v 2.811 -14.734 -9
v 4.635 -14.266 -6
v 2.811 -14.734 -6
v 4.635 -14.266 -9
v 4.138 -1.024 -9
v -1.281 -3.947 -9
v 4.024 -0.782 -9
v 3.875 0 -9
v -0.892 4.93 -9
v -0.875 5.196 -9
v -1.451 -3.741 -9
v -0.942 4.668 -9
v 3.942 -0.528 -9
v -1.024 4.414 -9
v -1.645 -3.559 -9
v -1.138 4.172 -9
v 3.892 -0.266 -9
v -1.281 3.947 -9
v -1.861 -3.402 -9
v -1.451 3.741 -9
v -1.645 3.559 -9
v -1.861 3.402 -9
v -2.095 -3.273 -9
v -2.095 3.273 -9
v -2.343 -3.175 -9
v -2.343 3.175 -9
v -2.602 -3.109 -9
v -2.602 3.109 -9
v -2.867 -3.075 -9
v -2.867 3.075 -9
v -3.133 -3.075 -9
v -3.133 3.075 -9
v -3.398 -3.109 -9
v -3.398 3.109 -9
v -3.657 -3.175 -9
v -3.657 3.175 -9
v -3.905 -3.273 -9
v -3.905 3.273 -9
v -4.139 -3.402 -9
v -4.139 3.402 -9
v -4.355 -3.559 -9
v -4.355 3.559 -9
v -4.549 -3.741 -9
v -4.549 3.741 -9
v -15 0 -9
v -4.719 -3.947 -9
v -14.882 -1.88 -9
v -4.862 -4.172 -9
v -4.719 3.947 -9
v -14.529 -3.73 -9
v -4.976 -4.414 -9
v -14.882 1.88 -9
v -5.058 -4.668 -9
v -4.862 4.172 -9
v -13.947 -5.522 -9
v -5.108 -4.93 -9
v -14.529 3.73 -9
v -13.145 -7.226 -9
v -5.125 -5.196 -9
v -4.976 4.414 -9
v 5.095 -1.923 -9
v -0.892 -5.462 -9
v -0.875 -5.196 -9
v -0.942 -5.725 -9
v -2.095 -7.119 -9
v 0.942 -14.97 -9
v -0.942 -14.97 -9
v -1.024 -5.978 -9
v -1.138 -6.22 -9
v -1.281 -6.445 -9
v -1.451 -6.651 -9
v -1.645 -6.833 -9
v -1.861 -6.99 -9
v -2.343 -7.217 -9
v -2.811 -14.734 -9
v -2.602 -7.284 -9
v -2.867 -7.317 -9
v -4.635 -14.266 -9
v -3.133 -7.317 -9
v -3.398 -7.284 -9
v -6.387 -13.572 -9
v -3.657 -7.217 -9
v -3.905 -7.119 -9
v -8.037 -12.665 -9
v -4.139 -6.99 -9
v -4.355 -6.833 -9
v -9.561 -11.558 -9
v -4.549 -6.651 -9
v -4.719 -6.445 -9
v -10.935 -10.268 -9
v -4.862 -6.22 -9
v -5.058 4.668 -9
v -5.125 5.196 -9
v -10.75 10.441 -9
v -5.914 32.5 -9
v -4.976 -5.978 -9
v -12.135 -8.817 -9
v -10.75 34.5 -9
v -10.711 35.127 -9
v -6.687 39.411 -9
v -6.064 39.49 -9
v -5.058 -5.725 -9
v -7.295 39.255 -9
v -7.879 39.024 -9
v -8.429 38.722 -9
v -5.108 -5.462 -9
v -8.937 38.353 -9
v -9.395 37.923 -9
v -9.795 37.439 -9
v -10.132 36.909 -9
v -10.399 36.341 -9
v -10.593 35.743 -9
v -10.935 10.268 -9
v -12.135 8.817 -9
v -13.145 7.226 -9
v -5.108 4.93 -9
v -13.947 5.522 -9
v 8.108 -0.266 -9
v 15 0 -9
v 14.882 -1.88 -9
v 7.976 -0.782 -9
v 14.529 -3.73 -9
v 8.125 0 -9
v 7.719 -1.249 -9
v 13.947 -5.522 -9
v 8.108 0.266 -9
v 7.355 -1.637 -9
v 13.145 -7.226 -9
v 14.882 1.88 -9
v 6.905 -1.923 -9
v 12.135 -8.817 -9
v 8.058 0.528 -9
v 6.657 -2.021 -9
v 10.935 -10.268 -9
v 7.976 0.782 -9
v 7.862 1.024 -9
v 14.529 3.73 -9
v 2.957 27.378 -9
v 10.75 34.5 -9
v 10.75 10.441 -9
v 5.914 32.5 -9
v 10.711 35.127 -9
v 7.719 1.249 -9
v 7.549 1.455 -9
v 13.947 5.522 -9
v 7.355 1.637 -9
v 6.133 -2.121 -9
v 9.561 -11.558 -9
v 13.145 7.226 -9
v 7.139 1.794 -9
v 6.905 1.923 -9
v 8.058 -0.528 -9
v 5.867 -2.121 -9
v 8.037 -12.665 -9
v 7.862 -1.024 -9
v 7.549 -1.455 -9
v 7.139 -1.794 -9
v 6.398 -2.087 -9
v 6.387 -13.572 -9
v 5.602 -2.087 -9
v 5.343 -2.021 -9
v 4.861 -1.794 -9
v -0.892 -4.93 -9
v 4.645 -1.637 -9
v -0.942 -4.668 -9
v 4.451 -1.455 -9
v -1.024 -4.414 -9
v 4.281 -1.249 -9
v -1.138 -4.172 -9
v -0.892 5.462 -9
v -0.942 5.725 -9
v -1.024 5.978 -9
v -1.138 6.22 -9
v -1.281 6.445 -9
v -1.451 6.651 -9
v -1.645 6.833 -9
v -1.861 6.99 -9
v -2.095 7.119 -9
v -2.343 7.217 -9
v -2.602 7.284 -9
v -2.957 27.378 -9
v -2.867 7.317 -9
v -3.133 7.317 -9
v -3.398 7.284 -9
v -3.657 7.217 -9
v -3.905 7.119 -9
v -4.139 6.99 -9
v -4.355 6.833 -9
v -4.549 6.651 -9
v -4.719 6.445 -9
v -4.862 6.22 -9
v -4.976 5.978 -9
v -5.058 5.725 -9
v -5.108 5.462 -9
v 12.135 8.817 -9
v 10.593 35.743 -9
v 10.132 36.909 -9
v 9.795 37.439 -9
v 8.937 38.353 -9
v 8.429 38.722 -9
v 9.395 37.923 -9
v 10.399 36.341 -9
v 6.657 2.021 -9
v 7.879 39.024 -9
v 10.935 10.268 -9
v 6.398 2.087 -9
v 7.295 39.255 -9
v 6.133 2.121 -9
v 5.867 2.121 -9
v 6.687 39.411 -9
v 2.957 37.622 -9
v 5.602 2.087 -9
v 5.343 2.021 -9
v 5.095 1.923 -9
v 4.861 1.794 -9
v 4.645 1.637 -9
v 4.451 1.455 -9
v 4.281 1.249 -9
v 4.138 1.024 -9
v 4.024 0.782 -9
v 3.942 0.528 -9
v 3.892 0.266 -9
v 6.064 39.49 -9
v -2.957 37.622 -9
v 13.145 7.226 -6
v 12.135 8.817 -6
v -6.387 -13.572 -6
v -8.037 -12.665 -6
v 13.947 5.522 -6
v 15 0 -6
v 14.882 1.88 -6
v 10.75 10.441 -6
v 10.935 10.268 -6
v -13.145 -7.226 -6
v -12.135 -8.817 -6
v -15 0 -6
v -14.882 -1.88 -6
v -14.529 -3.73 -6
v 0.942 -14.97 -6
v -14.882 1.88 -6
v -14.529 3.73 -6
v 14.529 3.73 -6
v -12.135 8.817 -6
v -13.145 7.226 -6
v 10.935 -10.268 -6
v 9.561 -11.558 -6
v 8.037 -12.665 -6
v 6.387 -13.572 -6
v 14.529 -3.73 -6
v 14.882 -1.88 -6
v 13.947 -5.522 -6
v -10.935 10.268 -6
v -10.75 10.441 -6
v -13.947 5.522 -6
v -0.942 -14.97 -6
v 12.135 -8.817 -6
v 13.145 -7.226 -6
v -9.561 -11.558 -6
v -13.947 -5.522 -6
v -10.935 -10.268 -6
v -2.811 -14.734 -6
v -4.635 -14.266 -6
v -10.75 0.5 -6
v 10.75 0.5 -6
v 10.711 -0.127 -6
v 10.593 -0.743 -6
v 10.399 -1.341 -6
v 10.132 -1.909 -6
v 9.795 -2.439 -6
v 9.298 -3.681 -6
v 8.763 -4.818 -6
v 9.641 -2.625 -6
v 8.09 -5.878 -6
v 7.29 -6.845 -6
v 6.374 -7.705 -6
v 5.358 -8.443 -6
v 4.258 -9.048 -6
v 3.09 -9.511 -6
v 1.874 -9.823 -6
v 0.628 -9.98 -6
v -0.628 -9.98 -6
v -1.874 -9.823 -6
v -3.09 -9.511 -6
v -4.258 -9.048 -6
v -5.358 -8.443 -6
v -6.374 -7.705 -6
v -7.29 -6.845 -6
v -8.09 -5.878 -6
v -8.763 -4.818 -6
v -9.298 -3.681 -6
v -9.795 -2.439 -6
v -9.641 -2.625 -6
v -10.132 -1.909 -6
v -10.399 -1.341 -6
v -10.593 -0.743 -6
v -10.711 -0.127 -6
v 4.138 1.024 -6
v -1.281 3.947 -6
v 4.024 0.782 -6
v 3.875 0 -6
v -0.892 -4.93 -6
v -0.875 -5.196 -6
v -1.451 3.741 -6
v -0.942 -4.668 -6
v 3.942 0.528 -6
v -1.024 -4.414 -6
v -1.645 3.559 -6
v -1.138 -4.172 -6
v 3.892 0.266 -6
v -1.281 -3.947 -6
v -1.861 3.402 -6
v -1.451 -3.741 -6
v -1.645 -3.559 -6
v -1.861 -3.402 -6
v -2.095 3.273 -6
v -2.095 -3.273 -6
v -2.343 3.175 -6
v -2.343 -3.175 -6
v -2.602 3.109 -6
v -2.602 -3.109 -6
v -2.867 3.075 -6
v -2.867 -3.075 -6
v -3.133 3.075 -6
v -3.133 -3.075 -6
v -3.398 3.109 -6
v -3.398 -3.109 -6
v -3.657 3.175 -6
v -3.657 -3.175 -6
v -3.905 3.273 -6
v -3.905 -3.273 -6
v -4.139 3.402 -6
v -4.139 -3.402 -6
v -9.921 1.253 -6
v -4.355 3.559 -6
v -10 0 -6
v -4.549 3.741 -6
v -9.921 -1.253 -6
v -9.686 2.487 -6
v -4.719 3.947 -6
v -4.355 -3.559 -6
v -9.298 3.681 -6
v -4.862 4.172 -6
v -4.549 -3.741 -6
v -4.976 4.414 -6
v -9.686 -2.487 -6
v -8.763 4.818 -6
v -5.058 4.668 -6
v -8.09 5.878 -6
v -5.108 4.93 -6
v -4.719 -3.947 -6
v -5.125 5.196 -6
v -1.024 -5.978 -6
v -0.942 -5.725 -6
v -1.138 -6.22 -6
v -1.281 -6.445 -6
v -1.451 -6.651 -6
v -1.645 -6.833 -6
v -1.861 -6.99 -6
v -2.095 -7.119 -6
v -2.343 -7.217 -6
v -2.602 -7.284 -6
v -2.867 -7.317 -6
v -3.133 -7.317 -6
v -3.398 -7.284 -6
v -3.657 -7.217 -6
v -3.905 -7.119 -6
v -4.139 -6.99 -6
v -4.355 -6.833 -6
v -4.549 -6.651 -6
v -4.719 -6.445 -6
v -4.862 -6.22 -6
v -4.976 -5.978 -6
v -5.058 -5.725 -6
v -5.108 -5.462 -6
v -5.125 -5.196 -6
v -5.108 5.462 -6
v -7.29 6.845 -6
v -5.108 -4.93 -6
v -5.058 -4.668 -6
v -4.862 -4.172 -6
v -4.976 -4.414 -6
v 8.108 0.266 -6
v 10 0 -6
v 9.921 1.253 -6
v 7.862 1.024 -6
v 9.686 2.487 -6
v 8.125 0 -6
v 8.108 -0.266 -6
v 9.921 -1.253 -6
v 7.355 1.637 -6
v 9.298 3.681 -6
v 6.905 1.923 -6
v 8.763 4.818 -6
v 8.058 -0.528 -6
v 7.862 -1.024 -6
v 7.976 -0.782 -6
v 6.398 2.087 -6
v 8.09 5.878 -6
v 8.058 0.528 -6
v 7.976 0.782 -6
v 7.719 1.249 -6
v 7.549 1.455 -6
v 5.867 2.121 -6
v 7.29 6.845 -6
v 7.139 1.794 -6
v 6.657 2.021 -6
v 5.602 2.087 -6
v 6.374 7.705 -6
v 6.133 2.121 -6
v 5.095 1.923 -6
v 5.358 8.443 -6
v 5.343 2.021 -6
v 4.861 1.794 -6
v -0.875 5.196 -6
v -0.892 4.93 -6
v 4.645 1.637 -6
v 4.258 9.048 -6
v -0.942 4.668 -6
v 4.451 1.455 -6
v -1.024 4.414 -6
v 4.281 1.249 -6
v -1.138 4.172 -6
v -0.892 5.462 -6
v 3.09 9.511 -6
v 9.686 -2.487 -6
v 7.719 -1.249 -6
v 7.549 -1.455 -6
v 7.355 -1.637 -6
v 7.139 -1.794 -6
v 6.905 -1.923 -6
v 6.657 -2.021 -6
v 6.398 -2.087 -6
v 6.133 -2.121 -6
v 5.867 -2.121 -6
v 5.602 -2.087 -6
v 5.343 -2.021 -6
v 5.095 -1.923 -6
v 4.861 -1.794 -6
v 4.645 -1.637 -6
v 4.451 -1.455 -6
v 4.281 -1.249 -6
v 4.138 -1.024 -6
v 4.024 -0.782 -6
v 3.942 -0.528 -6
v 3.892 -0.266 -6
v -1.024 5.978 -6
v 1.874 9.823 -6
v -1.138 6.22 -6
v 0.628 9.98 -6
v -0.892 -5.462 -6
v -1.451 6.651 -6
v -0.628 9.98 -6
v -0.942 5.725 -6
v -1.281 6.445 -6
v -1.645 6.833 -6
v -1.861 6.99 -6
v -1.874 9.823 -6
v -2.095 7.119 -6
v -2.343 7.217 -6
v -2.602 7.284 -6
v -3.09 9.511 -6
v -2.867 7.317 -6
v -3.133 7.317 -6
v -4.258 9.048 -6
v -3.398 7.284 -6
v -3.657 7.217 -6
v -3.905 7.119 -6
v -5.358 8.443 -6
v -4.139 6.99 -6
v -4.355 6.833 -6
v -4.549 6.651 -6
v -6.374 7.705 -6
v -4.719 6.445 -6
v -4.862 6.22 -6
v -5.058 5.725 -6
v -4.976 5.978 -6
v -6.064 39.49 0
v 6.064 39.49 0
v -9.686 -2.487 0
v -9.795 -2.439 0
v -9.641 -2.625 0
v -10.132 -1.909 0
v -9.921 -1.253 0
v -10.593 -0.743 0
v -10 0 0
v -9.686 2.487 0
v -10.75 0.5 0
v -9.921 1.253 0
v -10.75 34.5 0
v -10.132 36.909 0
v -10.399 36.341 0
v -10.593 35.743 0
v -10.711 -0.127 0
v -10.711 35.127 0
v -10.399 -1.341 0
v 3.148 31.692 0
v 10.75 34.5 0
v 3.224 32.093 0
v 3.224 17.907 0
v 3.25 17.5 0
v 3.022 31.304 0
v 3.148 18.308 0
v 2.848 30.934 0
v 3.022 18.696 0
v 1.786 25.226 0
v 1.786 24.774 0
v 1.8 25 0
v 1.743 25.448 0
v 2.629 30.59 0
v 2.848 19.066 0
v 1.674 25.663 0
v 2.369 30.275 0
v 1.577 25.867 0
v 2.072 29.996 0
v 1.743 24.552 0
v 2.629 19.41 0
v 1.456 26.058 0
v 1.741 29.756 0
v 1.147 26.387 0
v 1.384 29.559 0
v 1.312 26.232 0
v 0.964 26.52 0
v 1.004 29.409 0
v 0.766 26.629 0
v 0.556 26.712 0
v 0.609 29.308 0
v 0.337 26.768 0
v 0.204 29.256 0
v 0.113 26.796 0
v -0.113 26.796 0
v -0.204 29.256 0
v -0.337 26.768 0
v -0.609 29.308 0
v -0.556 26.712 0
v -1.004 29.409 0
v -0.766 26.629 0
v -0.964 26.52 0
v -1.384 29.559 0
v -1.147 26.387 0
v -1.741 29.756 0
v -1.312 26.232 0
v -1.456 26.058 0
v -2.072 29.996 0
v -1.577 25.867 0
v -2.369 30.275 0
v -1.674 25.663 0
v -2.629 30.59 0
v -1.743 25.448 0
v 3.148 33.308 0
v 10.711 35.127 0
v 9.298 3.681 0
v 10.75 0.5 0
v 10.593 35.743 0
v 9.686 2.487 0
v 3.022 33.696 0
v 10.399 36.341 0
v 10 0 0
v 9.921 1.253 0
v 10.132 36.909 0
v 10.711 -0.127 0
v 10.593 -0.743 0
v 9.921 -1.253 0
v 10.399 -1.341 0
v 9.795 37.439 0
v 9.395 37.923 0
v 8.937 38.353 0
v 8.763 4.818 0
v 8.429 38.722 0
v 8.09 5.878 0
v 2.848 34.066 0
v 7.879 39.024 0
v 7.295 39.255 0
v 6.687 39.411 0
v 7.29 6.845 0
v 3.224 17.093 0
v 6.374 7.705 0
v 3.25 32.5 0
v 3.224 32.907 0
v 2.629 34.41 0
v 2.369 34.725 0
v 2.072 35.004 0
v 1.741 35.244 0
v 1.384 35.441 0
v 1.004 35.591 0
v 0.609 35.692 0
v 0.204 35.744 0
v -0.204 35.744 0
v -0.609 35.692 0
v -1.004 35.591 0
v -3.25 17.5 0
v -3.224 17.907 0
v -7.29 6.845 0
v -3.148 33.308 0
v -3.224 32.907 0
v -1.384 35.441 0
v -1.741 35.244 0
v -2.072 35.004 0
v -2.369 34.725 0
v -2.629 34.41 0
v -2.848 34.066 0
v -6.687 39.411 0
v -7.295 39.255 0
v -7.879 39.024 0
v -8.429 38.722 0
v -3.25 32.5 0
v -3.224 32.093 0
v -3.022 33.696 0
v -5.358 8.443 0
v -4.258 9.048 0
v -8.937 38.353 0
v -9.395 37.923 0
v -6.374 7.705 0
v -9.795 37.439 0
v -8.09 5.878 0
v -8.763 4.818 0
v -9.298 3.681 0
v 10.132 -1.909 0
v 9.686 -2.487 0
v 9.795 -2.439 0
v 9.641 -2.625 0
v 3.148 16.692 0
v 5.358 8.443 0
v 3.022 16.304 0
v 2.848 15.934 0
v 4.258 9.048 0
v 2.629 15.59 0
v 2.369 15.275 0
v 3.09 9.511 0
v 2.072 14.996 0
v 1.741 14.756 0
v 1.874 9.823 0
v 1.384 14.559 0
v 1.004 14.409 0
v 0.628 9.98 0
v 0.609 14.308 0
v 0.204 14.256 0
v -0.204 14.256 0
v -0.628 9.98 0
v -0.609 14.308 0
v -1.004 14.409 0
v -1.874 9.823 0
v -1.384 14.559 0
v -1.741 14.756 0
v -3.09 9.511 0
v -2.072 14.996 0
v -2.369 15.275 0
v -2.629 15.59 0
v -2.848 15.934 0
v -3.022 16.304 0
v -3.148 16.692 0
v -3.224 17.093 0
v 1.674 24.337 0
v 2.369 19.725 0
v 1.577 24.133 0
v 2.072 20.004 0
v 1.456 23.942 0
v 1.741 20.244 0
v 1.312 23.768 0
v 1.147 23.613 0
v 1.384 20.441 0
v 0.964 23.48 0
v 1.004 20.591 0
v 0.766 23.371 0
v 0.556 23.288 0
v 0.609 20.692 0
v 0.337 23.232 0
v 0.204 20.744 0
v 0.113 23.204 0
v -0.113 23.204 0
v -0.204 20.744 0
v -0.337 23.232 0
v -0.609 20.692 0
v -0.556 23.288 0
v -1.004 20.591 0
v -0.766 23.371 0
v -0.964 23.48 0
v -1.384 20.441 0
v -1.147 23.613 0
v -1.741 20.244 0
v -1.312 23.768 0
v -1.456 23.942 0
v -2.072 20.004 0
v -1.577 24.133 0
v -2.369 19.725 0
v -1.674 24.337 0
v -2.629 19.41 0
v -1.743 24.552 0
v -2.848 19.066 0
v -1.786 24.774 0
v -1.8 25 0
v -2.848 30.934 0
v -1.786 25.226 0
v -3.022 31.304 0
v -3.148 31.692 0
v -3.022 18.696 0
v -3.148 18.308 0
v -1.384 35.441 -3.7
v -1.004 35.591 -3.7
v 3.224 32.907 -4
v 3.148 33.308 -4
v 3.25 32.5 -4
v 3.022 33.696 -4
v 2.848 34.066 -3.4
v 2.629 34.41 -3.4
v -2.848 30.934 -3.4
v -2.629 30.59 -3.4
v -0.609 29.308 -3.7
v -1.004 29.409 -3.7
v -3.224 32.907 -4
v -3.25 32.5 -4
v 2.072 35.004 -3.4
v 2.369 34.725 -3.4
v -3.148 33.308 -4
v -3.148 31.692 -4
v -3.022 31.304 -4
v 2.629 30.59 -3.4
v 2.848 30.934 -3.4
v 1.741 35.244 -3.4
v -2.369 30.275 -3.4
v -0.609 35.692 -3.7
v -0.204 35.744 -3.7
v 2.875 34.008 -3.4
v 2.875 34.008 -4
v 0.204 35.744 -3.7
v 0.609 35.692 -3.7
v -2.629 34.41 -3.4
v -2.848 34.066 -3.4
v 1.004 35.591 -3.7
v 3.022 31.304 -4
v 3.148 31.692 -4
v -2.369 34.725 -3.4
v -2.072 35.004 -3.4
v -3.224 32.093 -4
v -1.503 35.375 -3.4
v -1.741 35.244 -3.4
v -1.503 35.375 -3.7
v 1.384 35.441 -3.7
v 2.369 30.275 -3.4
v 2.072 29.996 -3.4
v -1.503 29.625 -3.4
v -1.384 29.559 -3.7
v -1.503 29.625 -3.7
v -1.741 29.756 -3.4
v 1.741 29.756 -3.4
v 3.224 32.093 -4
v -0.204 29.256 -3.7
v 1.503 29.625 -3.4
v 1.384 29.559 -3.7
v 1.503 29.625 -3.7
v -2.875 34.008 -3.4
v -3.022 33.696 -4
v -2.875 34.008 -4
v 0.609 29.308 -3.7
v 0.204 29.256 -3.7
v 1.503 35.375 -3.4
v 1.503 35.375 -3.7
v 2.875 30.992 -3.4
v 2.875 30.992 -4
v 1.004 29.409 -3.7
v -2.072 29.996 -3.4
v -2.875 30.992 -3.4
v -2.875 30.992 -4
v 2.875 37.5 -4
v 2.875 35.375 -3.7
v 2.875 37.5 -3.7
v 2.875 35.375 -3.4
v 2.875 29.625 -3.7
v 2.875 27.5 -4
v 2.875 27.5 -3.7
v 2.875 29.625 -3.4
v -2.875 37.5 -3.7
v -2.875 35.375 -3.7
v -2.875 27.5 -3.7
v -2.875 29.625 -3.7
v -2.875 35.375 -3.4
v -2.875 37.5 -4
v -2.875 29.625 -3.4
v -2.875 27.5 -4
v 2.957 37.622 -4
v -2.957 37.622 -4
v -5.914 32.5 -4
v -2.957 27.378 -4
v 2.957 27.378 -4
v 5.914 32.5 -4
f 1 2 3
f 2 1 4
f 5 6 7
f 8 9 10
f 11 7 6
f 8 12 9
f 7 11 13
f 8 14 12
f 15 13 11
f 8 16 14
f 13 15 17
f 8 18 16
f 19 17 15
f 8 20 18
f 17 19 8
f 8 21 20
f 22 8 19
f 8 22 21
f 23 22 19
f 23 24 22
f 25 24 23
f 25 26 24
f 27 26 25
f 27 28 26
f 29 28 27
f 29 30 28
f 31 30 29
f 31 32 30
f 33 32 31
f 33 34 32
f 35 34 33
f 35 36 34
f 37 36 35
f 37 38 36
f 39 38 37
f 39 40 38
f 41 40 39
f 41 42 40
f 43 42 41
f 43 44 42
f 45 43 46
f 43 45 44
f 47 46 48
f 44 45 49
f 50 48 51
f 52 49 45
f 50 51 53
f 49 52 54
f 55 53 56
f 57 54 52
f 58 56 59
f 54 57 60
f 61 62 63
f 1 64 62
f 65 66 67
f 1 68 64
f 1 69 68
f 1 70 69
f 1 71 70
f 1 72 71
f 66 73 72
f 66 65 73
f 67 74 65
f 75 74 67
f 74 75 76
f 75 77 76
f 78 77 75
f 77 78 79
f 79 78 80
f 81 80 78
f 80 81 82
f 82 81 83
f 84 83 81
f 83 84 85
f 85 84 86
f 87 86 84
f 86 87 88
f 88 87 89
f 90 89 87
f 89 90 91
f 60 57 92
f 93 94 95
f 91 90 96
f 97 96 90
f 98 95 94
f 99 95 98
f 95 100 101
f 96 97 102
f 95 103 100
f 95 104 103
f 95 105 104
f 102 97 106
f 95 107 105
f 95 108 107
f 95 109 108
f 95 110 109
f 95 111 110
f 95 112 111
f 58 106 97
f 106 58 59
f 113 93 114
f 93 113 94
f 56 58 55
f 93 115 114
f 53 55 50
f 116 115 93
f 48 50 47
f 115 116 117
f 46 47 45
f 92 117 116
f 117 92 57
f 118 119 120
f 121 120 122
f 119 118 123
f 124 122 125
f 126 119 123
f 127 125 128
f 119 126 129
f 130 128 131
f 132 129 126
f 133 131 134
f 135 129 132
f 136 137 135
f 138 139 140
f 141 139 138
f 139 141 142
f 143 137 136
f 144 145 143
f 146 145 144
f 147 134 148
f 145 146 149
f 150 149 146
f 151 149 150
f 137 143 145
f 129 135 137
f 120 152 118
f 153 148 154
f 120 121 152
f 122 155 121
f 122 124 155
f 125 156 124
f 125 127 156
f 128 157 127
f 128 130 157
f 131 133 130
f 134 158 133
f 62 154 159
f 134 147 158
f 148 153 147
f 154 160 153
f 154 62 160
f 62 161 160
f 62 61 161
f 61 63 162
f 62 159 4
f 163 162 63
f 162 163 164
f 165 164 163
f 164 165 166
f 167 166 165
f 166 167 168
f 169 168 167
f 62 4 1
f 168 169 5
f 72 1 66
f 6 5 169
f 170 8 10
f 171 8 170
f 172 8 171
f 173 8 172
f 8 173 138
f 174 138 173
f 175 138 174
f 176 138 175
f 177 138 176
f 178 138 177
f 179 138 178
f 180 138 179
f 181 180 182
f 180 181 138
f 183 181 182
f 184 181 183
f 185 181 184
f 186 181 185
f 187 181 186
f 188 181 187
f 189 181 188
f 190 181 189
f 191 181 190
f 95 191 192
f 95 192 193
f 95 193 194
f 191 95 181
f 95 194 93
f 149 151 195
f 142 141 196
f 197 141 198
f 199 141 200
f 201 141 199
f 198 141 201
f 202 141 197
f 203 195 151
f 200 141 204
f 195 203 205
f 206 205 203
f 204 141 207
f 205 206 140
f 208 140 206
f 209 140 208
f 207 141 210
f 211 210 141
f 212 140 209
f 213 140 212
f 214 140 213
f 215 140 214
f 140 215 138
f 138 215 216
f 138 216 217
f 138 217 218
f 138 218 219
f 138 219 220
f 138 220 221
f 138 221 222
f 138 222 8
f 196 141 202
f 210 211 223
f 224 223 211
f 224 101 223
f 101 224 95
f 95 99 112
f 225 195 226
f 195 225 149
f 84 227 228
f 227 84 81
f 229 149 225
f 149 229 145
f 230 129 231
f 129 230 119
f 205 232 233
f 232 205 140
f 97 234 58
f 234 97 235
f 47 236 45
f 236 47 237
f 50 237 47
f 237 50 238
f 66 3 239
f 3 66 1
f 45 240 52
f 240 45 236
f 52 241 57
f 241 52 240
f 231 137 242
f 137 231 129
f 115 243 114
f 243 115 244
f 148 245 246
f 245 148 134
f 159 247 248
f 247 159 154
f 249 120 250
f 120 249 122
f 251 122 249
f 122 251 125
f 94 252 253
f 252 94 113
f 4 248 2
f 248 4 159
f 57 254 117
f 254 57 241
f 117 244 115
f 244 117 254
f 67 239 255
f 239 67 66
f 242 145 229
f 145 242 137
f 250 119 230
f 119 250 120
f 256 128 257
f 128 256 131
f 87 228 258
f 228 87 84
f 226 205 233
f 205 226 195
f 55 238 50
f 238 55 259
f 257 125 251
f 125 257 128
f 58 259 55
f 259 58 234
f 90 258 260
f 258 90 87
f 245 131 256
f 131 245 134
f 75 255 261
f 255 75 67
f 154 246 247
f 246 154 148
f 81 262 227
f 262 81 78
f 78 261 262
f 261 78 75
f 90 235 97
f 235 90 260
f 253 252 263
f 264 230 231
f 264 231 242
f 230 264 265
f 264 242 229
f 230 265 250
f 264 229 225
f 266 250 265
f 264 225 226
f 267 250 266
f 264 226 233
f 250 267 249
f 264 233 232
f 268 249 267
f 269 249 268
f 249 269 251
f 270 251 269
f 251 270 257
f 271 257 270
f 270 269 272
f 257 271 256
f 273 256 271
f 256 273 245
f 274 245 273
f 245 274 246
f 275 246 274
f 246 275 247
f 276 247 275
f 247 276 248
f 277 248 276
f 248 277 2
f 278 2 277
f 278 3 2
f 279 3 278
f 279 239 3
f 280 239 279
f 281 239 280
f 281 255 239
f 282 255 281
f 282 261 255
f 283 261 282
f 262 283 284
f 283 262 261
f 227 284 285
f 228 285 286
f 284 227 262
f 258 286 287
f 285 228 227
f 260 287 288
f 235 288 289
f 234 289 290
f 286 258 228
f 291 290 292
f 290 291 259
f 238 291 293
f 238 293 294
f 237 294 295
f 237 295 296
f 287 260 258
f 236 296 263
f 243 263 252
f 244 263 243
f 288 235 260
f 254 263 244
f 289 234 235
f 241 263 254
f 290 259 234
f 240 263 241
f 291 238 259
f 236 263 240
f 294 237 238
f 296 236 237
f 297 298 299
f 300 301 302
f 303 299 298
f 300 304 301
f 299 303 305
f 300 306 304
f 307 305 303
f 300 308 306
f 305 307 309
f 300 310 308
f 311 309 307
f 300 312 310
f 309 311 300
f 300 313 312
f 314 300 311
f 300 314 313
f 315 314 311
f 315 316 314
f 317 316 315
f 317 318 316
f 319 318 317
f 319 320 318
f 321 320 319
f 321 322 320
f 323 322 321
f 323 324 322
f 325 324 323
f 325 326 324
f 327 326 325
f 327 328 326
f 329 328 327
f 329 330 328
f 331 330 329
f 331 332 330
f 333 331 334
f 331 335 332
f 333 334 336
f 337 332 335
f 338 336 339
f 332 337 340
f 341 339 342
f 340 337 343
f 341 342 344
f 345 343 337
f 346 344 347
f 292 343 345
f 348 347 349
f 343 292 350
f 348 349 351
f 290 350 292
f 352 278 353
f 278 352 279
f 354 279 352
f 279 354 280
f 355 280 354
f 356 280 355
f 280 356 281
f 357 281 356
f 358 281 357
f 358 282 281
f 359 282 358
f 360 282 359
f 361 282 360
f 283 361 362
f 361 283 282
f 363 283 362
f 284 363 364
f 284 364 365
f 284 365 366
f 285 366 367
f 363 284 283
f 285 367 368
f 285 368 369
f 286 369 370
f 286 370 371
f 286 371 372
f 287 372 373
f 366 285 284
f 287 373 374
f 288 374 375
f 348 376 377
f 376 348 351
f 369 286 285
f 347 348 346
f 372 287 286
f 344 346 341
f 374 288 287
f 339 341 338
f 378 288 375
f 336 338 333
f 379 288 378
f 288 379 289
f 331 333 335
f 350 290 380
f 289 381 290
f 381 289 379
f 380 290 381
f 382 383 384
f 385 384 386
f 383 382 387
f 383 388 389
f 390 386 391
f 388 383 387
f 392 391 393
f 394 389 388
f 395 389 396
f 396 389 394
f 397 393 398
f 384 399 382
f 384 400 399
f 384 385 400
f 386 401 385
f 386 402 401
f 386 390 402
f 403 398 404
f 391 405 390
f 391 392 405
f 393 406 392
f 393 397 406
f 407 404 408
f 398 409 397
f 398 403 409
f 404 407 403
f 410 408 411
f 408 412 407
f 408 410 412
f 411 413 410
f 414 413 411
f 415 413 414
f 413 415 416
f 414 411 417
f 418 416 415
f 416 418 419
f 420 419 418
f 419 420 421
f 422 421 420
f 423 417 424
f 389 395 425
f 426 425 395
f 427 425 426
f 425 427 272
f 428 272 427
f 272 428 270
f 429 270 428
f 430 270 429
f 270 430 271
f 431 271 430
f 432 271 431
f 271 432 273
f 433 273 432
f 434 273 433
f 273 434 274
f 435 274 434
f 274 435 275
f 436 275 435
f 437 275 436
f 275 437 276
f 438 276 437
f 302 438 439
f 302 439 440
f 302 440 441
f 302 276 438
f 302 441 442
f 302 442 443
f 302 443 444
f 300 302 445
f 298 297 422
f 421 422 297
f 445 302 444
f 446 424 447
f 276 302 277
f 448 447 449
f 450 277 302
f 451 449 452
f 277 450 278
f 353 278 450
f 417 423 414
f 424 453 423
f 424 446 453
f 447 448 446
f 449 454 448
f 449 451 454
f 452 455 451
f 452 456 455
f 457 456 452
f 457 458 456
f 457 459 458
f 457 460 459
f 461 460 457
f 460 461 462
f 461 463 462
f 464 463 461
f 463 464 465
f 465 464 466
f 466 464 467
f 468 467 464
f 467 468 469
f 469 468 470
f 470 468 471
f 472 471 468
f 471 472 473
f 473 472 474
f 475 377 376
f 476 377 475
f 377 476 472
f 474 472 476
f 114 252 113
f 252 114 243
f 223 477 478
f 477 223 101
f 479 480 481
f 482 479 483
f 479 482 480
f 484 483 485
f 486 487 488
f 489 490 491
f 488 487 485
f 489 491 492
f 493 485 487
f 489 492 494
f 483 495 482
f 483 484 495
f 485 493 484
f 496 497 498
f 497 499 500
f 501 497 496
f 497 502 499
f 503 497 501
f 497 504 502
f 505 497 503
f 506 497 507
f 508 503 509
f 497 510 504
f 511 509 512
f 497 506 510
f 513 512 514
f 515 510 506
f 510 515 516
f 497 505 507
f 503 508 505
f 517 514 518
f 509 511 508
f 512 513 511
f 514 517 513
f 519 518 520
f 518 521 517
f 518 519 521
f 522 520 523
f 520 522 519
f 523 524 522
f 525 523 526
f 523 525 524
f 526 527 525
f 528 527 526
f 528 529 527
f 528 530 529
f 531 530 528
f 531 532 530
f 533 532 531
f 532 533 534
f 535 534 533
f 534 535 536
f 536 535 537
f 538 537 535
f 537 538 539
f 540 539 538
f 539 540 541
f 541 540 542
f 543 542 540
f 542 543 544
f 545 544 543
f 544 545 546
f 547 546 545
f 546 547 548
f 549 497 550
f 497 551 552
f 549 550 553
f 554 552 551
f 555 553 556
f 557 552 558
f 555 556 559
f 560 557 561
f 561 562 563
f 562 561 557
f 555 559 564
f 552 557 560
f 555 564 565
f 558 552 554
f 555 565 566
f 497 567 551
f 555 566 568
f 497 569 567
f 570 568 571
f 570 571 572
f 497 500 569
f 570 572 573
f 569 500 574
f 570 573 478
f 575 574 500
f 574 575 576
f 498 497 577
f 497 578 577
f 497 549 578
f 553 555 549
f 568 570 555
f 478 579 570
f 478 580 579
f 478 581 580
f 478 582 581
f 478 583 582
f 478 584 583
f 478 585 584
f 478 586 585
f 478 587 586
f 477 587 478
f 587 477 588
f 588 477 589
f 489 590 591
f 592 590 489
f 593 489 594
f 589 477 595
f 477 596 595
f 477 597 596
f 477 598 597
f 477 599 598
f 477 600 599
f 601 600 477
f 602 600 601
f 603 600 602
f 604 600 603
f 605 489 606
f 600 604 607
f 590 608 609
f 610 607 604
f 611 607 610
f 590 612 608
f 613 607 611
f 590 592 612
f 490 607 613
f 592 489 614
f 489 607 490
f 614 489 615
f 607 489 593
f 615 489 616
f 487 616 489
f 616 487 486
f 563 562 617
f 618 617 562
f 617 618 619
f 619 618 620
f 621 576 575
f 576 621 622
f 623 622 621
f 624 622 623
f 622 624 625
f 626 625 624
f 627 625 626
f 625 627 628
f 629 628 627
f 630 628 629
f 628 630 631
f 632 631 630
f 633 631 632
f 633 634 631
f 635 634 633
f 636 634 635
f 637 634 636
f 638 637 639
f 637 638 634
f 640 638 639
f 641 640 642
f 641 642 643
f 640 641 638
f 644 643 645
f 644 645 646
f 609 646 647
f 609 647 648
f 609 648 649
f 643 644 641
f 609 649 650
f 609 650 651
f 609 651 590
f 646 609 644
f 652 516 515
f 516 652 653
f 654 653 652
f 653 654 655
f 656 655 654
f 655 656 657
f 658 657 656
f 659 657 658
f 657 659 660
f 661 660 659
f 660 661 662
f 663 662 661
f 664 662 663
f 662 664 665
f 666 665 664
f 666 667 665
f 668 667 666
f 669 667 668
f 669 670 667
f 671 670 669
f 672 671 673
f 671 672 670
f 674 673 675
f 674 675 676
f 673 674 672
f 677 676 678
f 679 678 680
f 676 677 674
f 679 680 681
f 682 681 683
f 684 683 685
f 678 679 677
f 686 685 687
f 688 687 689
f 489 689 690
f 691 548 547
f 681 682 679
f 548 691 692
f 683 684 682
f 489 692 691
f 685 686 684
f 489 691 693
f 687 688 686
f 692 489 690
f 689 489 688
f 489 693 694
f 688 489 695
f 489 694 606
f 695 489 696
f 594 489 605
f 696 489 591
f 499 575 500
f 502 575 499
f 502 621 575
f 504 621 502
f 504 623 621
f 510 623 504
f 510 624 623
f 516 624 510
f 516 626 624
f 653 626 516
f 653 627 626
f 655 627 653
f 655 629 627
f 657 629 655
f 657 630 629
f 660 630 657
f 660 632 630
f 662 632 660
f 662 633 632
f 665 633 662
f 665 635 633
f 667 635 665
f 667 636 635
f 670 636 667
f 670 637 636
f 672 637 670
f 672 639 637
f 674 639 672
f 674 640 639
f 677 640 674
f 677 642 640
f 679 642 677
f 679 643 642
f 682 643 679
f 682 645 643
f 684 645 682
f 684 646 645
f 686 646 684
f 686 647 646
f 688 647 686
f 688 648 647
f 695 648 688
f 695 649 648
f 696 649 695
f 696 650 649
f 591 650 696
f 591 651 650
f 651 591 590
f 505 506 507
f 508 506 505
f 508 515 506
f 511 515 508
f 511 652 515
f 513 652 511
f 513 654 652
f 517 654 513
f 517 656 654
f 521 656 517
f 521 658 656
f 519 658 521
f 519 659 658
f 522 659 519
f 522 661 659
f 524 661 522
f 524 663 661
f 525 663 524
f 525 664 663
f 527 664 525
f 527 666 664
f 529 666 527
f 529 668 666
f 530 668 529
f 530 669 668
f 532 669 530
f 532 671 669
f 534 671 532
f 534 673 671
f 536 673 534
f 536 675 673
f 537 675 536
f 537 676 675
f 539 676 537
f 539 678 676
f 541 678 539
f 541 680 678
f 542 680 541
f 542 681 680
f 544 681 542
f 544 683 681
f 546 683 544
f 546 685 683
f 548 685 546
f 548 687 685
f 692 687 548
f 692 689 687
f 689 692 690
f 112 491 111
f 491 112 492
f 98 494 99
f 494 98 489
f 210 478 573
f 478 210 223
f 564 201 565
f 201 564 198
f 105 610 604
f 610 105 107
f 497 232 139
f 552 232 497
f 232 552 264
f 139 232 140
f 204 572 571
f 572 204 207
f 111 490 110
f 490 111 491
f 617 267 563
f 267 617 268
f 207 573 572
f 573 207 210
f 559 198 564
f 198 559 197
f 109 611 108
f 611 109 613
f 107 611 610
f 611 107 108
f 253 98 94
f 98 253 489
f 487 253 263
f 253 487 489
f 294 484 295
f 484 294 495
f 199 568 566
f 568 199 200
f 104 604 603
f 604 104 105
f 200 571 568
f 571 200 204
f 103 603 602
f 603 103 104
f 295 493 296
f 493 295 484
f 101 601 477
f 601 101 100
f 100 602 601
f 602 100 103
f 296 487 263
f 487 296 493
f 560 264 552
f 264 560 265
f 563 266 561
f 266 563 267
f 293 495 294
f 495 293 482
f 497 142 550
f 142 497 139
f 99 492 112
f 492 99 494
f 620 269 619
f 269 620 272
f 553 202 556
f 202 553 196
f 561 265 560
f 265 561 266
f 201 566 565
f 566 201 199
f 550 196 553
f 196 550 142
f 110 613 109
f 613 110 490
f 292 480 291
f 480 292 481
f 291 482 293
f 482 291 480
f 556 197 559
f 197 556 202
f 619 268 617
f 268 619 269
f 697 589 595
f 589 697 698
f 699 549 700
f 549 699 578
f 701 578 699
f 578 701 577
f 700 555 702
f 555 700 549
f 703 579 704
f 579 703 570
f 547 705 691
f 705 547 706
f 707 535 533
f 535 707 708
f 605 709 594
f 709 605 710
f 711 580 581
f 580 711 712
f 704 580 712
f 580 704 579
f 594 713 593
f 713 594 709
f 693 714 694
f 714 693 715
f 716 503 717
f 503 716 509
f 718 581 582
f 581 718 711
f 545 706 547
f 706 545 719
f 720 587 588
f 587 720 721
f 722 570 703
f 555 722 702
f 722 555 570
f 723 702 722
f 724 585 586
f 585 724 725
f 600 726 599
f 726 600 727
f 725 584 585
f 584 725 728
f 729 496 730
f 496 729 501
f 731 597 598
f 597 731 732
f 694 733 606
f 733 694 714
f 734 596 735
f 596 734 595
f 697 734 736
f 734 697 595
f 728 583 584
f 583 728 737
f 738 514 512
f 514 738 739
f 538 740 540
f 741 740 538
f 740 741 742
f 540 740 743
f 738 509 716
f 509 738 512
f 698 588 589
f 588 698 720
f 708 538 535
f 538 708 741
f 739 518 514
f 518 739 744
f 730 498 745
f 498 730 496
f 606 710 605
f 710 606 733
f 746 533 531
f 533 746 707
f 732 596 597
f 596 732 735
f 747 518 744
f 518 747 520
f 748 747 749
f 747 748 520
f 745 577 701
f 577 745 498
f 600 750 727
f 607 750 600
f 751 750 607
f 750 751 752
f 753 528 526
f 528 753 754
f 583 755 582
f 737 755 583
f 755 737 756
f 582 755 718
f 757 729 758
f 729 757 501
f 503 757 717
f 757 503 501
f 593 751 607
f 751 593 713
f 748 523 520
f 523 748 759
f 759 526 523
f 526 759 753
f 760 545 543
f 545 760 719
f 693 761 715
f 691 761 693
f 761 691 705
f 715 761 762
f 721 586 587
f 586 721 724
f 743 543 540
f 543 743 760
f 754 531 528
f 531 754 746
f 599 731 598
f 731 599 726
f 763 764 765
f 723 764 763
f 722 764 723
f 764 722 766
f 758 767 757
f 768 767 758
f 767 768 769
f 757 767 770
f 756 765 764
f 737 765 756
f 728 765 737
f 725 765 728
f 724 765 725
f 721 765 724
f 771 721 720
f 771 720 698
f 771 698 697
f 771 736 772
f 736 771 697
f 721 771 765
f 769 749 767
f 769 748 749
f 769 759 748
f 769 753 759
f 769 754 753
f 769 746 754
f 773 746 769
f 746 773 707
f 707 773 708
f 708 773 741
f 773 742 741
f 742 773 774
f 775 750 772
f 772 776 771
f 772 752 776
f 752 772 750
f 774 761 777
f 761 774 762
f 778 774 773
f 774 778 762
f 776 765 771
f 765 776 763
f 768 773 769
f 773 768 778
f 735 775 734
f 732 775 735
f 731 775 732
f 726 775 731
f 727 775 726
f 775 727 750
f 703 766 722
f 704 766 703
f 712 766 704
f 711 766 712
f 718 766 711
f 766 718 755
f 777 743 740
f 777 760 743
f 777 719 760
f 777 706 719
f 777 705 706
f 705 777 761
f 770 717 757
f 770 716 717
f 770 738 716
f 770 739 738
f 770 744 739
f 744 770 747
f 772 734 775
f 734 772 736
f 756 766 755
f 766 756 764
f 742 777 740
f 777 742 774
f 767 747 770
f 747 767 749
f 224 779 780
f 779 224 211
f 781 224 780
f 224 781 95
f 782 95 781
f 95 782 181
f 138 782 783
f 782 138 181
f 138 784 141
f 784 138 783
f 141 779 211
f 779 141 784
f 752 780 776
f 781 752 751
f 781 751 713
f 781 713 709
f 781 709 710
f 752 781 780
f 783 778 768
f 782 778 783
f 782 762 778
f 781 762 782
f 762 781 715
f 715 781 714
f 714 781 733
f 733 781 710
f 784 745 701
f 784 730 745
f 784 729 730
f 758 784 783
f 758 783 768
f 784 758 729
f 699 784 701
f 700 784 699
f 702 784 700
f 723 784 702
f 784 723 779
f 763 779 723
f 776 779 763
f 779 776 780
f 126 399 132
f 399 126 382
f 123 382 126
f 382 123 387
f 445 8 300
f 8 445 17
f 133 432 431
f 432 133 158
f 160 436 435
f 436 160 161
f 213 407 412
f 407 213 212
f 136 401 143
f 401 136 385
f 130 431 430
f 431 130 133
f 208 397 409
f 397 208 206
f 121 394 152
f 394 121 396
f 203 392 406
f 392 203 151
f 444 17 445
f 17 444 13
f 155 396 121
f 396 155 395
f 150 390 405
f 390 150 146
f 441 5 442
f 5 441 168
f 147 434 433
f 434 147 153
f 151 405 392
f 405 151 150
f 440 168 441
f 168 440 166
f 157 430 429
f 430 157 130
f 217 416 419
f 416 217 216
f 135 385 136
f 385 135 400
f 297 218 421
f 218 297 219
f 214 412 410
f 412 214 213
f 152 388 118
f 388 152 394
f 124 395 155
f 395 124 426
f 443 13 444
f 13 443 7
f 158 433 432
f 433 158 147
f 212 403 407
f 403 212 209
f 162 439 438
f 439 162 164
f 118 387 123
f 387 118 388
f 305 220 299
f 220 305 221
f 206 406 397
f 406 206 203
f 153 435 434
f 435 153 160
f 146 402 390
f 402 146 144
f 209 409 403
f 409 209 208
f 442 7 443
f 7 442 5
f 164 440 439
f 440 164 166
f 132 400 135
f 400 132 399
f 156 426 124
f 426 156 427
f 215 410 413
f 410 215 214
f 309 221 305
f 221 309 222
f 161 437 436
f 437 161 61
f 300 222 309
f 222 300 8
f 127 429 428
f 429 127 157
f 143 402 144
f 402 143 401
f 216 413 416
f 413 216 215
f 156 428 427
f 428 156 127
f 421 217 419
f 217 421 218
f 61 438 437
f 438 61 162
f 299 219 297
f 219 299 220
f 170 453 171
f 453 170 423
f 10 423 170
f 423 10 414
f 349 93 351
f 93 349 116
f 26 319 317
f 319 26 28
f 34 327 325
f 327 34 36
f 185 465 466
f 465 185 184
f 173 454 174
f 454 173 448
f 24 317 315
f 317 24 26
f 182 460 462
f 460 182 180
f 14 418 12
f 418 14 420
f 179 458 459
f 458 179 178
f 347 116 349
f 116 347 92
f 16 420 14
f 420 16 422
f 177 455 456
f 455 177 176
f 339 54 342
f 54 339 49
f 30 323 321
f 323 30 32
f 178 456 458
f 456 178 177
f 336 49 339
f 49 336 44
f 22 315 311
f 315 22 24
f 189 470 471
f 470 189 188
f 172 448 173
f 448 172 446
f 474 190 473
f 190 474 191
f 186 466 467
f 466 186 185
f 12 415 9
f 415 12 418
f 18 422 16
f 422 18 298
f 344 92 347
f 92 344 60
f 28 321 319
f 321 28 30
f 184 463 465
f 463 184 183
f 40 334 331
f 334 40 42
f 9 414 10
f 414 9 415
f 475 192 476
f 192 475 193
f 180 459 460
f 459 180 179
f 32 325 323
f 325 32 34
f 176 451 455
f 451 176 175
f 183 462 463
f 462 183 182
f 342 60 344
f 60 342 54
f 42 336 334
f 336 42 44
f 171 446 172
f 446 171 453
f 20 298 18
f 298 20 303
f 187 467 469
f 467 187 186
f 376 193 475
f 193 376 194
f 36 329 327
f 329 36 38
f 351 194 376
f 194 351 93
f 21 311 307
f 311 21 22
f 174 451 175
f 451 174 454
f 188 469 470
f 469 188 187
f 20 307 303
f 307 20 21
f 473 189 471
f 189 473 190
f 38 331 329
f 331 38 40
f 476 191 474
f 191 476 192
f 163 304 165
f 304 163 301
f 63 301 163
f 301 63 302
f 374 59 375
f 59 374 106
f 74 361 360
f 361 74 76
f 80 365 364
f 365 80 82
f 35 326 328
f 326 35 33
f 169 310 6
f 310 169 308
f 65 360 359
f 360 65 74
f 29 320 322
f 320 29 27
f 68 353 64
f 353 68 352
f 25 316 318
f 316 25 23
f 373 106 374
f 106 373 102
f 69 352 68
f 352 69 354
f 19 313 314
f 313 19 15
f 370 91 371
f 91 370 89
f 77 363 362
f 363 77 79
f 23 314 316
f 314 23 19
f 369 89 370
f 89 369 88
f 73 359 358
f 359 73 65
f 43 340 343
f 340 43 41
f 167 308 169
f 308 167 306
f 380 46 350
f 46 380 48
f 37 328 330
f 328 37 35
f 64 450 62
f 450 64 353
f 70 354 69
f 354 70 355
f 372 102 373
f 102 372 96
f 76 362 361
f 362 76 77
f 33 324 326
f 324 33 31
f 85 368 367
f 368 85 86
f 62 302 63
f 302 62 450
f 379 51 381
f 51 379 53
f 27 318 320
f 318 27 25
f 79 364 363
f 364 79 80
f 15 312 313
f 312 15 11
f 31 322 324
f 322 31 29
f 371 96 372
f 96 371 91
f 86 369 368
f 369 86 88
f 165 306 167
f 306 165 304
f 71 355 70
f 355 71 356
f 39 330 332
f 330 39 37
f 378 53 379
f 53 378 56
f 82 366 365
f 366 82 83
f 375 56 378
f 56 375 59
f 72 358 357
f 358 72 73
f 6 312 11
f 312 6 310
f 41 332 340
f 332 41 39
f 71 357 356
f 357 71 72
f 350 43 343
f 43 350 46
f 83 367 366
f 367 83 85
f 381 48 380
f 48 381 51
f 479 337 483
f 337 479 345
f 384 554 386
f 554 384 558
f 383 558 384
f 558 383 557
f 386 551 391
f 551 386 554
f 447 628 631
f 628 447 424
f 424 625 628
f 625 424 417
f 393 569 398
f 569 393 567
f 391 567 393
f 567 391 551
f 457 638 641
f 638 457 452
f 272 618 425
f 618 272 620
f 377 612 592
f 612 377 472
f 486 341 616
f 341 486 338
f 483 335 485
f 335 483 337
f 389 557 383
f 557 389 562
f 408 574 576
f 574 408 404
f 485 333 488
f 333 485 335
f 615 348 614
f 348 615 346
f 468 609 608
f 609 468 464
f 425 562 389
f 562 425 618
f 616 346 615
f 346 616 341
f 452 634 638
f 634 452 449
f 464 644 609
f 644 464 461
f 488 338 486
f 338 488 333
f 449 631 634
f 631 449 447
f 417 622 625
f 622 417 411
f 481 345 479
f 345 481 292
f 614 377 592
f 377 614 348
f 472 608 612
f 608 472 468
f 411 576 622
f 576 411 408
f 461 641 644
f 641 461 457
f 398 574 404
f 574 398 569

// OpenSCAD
$fn = 50;


difference() {
	union() {
		translate(v = [0, 0, -9.0000000000]) {
			cylinder(h = 3, r = 15.0000000000);
		}
		translate(v = [0, 17.5000000000, -9]) {
			hull() {
				translate(v = [-2.0000000000, 17.0000000000, 0]) {
					cylinder(h = 9, r = 5);
				}
				translate(v = [2.0000000000, 17.0000000000, 0]) {
					cylinder(h = 9, r = 5);
				}
				translate(v = [-2.0000000000, -17.0000000000, 0]) {
					cylinder(h = 9, r = 5);
				}
				translate(v = [2.0000000000, -17.0000000000, 0]) {
					cylinder(h = 9, r = 5);
				}
			}
		}
		translate(v = [0, 17.5000000000, -9]) {
			hull() {
				translate(v = [-5.7500000000, 17.0000000000, 0]) {
					cylinder(h = 9, r = 5);
				}
				translate(v = [5.7500000000, 17.0000000000, 0]) {
					cylinder(h = 9, r = 5);
				}
				translate(v = [-5.7500000000, -17.0000000000, 0]) {
					cylinder(h = 9, r = 5);
				}
				translate(v = [5.7500000000, -17.0000000000, 0]) {
					cylinder(h = 9, r = 5);
				}
			}
		}
	}
	union() {
		translate(v = [0, 32.5000000000, 0]) {
			rotate(a = [0, 0, 0]) {
				difference() {
					union() {
						translate(v = [0, 0, -50.0000000000]) {
							cylinder(h = 100, r = 3.2500000000);
						}
					}
					union();
				}
			}
		}
		translate(v = [0, 32.5000000000, -9]) {
			rotate(a = [0, 0, 0]) {
				difference() {
					union() {
						translate(v = [-2.8750000000, -5.0000000000, -0.3000000000]) {
							cube(size = [5.7500000000, 10, 0.3000000000]);
						}
						translate(v = [-2.8750000000, -2.8750000000, -0.6000000000]) {
							cube(size = [5.7500000000, 5.7500000000, 0.3000000000]);
						}
						translate(v = [-2.8750000000, -5.0000000000, 5]) {
							cube(size = [5.7500000000, 10, 0.3000000000]);
						}
						translate(v = [-2.8750000000, -2.8750000000, 5.3000000000]) {
							cube(size = [5.7500000000, 5.7500000000, 0.3000000000]);
						}
						linear_extrude(height = 5) {
							polygon(points = [[5.9142500000, 0.0000000000], [2.9571250000, 5.1218907443], [-2.9571250000, 5.1218907443], [-5.9142500000, 0.0000000000], [-2.9571250000, -5.1218907443], [2.9571250000, -5.1218907443]]);
						}
						translate(v = [-2.8750000000, -5.0000000000, -0.3000000000]) {
							cube(size = [5.7500000000, 10, 0.3000000000]);
						}
						translate(v = [-2.8750000000, -2.8750000000, -0.6000000000]) {
							cube(size = [5.7500000000, 5.7500000000, 0.3000000000]);
						}
						translate(v = [-2.8750000000, -5.0000000000, 5]) {
							cube(size = [5.7500000000, 10, 0.3000000000]);
						}
						translate(v = [-2.8750000000, -2.8750000000, 5.3000000000]) {
							cube(size = [5.7500000000, 5.7500000000, 0.3000000000]);
						}
						translate(v = [-2.8750000000, -5.0000000000, -0.3000000000]) {
							cube(size = [5.7500000000, 10, 0.3000000000]);
						}
						translate(v = [-2.8750000000, -2.8750000000, -0.6000000000]) {
							cube(size = [5.7500000000, 5.7500000000, 0.3000000000]);
						}
						translate(v = [-2.8750000000, -5.0000000000, 5]) {
							cube(size = [5.7500000000, 10, 0.3000000000]);
						}
						translate(v = [-2.8750000000, -2.8750000000, 5.3000000000]) {
							cube(size = [5.7500000000, 5.7500000000, 0.3000000000]);
						}
					}
					union();
				}
			}
		}
		translate(v = [6.0000000000, 0.0000000000, 41]) {
			rotate(a = [0, 0, 0]) {
				difference() {
					union() {
						translate(v = [0, 0, -59.0000000000]) {
							cylinder(h = 59, r = 2.0000000000);
						}
						translate(v = [0, 0, -3]) {
							cylinder(h = 3, r1 = 2.1250000000, r2 = 3.7500000000);
						}
						translate(v = [0, 0, -59.0000000000]) {
							cylinder(h = 59, r = 2.1250000000);
						}
						translate(v = [0, 0, -59.0000000000]) {
							cylinder(h = 59, r = 2.0000000000);
						}
					}
					union();
				}
			}
		}
		translate(v = [-3.0000000000, 5.1961524227, 41]) {
			rotate(a = [0, 0, 0]) {
				difference() {
					union() {
						translate(v = [0, 0, -59.0000000000]) {
							cylinder(h = 59, r = 2.0000000000);
						}
						translate(v = [0, 0, -3]) {
							cylinder(h = 3, r1 = 2.1250000000, r2 = 3.7500000000);
						}
						translate(v = [0, 0, -59.0000000000]) {
							cylinder(h = 59, r = 2.1250000000);
						}
						translate(v = [0, 0, -59.0000000000]) {
							cylinder(h = 59, r = 2.0000000000);
						}
					}
					union();
				}
			}
		}
		translate(v = [-3.0000000000, -5.1961524227, 41]) {
			rotate(a = [0, 0, 0]) {
				difference() {
					union() {
						translate(v = [0, 0, -59.0000000000]) {
							cylinder(h = 59, r = 2.0000000000);
						}
						translate(v = [0, 0, -3]) {
							cylinder(h = 3, r1 = 2.1250000000, r2 = 3.7500000000);
						}
						translate(v = [0, 0, -59.0000000000]) {
							cylinder(h = 59, r = 2.1250000000);
						}
						translate(v = [0, 0, -59.0000000000]) {
							cylinder(h = 59, r = 2.0000000000);
						}
					}
					union();
				}
			}
		}
		translate(v = [0, 0, -6.0000000000]) {
			cylinder(h = 100, r = 10.0000000000);
		}
		translate(v = [0.0000000000, 32.5000000000, 0]) {
			cylinder(h = 9, r = 3.2500000000);
		}
		translate(v = [0.0000000000, 17.5000000000, 0]) {
			cylinder(h = 9, r = 3.2500000000);
		}
		translate(v = [0.0000000000, 25.0000000000, 0]) {
			cylinder(h = 9, r = 1.8000000000);
		}
	}
}
